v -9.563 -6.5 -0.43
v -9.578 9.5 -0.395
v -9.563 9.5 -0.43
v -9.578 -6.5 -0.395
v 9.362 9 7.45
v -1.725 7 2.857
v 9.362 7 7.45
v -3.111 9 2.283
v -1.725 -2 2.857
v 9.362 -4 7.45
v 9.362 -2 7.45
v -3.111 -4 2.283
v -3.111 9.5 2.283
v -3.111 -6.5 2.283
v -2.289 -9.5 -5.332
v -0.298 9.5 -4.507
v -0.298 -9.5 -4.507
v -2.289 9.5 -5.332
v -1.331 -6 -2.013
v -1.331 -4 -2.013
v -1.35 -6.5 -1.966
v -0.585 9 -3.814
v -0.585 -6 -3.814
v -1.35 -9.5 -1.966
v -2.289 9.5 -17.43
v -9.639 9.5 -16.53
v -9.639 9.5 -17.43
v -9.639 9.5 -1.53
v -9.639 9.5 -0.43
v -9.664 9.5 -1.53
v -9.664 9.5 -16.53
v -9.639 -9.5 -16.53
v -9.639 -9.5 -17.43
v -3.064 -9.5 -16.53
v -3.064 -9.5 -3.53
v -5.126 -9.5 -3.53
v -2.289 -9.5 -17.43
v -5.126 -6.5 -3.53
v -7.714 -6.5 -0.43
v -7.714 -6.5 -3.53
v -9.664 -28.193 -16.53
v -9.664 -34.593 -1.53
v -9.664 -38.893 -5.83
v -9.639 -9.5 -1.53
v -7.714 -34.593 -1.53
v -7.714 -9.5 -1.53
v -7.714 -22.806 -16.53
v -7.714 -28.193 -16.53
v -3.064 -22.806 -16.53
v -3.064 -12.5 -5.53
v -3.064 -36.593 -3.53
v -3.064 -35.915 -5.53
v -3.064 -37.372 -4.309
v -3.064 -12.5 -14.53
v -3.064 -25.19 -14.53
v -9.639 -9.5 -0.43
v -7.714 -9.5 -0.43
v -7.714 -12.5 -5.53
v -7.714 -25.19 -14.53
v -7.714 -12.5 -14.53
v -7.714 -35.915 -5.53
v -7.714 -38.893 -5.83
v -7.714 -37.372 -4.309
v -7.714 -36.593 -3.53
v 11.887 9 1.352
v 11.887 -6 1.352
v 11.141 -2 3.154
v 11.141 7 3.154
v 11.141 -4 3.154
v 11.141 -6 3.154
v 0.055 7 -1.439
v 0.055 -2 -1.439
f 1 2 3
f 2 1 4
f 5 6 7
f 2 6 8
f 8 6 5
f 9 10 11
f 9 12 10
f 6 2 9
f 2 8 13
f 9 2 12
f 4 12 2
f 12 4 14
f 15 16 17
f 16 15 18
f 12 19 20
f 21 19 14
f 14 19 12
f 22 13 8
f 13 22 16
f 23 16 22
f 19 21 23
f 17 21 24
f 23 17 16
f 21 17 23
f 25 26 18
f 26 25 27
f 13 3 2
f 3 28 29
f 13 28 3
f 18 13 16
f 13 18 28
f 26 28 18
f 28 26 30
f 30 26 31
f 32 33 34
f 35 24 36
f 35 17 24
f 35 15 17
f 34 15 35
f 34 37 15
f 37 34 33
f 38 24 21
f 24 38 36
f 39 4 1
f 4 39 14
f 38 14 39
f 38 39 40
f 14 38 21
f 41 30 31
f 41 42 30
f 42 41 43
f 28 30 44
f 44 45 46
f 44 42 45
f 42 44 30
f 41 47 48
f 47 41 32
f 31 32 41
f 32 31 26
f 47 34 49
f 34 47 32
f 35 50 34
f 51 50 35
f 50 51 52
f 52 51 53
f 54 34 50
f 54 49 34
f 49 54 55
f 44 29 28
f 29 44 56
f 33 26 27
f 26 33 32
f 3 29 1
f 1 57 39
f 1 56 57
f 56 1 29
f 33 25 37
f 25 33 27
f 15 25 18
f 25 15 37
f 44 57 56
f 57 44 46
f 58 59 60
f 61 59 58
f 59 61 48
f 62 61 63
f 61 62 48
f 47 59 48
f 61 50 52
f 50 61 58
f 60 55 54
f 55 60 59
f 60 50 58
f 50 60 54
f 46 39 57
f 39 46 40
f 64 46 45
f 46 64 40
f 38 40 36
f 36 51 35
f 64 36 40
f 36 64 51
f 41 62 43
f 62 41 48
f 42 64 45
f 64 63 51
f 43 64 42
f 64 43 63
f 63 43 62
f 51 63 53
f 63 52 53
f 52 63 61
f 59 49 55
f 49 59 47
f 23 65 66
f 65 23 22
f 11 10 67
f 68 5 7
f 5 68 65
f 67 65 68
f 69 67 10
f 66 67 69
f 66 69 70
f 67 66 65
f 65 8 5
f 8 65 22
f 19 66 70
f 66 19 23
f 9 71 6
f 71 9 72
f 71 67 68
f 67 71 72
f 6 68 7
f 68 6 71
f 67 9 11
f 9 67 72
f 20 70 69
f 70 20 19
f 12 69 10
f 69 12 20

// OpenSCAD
//translate([50, 0, 0])
//rotate([0, -22.5, 0])
//flat_corner();

mirror([0, 0, 1])
rotate([0, 22.5+180, 0])
angled_corner();



module flat_corner(){
    
    //corner
    difference(){
    
        translate([0, 0, -0.75/2])
        cube([19, 19, 7.35], center = true);
        
        translate([-14, -14, -2])
        cube([15, 15, 6.6], center=true);
        
    
    }
        
    
    //long arm
    difference(){
        
        translate([0, -24.5, 0])
        cube([15, 30, 6.6], center=true);
        
        translate([1, -27.5, -1])
        cube([9, 30, 4.7], center=true);
        
        translate([-10, -24.5, -1])
        cube([9, 30, 4.7], center=true);
        
        
        translate([5, -42.5, 0])
        rotate([0, 0, 45])
        cube([25, 15, 7.6], center=true);
        
        translate([-12, -42.5, 0])
        rotate([0, 0, -45])
        cube([25, 15, 7.6], center=true);
        
        translate([5, -38.5, -2.5])
        rotate([0, 0, 40])
        cube([25, 15, 7.6], center=true);
        
        translate([-1, -27.5, -4.9])
        rotate([-35, 0, 40])
        cube([25, 15, 4.7], center=true);
        
        
        
    }
    
    //short arm
    difference(){
        
        translate([ -17, 0, 0])
        cube([15, 15, 6.6], center=true);
        
        translate([-20, 1, -1])
        cube([15, 9, 4.7], center=true);
        
        translate([-17, -10, -1])
        cube([15, 9, 4.7], center=true);
        
    }
    
}

module angled_corner(){
    
    //corner
    difference(){
    
        translate([5.5, 0, -0.75/2])
        cube([7, 19, 7.35], center = true);
        
        translate([4.5, -9, 2])
        cube([9, 5, 6.6], center=true);
        
    
    }
    
    
    
    //long arm
    color("red")
    translate([2, 0, -4.4])
    rotate([0, -22.5, 0])
    difference(){
        
        union(){
            
            translate([9.5-3.3, -24.5+9.5, -7.5+3.3])
            cube([6.6, 49, 15], center=true);
            
            translate([6.5-0.75+0.05, 0, -4.1])
            cube([7.35, 19, 17], center = true);
            
        }
        
        translate([-1+9.5-3.3, -27.5, -8.5+3.3])
        cube([4.7, 30, 9], center=true);
        
        translate([-1.5+9.5-3.3, -22.5, -2.5+2.5+3.3])
        cube([5.7, 34, 4], center=true);
        
        translate([6.4, -40.5, -10])
        rotate([-45, 0, 0])
        cube([7.6, 25, 15], center=true);
        
        translate([6.4, -40.5, 8])
        rotate([45, 0, 0])
        cube([7.6, 25, 15], center=true);
        
        translate([3.75, -36.5, -10])
        rotate([-40, 0, 0])
        cube([7.6, 25, 15], center=true);
        
        //translate([1.3, -25.7, -3])
        //rotate([-40, 0, 0])
        //rotate([0, -35, 0])
        //#cube([4.7, 25, 15], center=true);
        
    }
    
    //short arm
    difference(){
        
        translate([-4, 1.5, 0])
        cube([15, 15, 6.6], center=true);
        
        translate([-7, 2.5, 1])
        cube([15, 9, 4.7], center=true);
        
        translate([-4, -8.5, 1])
        cube([15, 9, 4.7], center=true);
        
    }
    
}
